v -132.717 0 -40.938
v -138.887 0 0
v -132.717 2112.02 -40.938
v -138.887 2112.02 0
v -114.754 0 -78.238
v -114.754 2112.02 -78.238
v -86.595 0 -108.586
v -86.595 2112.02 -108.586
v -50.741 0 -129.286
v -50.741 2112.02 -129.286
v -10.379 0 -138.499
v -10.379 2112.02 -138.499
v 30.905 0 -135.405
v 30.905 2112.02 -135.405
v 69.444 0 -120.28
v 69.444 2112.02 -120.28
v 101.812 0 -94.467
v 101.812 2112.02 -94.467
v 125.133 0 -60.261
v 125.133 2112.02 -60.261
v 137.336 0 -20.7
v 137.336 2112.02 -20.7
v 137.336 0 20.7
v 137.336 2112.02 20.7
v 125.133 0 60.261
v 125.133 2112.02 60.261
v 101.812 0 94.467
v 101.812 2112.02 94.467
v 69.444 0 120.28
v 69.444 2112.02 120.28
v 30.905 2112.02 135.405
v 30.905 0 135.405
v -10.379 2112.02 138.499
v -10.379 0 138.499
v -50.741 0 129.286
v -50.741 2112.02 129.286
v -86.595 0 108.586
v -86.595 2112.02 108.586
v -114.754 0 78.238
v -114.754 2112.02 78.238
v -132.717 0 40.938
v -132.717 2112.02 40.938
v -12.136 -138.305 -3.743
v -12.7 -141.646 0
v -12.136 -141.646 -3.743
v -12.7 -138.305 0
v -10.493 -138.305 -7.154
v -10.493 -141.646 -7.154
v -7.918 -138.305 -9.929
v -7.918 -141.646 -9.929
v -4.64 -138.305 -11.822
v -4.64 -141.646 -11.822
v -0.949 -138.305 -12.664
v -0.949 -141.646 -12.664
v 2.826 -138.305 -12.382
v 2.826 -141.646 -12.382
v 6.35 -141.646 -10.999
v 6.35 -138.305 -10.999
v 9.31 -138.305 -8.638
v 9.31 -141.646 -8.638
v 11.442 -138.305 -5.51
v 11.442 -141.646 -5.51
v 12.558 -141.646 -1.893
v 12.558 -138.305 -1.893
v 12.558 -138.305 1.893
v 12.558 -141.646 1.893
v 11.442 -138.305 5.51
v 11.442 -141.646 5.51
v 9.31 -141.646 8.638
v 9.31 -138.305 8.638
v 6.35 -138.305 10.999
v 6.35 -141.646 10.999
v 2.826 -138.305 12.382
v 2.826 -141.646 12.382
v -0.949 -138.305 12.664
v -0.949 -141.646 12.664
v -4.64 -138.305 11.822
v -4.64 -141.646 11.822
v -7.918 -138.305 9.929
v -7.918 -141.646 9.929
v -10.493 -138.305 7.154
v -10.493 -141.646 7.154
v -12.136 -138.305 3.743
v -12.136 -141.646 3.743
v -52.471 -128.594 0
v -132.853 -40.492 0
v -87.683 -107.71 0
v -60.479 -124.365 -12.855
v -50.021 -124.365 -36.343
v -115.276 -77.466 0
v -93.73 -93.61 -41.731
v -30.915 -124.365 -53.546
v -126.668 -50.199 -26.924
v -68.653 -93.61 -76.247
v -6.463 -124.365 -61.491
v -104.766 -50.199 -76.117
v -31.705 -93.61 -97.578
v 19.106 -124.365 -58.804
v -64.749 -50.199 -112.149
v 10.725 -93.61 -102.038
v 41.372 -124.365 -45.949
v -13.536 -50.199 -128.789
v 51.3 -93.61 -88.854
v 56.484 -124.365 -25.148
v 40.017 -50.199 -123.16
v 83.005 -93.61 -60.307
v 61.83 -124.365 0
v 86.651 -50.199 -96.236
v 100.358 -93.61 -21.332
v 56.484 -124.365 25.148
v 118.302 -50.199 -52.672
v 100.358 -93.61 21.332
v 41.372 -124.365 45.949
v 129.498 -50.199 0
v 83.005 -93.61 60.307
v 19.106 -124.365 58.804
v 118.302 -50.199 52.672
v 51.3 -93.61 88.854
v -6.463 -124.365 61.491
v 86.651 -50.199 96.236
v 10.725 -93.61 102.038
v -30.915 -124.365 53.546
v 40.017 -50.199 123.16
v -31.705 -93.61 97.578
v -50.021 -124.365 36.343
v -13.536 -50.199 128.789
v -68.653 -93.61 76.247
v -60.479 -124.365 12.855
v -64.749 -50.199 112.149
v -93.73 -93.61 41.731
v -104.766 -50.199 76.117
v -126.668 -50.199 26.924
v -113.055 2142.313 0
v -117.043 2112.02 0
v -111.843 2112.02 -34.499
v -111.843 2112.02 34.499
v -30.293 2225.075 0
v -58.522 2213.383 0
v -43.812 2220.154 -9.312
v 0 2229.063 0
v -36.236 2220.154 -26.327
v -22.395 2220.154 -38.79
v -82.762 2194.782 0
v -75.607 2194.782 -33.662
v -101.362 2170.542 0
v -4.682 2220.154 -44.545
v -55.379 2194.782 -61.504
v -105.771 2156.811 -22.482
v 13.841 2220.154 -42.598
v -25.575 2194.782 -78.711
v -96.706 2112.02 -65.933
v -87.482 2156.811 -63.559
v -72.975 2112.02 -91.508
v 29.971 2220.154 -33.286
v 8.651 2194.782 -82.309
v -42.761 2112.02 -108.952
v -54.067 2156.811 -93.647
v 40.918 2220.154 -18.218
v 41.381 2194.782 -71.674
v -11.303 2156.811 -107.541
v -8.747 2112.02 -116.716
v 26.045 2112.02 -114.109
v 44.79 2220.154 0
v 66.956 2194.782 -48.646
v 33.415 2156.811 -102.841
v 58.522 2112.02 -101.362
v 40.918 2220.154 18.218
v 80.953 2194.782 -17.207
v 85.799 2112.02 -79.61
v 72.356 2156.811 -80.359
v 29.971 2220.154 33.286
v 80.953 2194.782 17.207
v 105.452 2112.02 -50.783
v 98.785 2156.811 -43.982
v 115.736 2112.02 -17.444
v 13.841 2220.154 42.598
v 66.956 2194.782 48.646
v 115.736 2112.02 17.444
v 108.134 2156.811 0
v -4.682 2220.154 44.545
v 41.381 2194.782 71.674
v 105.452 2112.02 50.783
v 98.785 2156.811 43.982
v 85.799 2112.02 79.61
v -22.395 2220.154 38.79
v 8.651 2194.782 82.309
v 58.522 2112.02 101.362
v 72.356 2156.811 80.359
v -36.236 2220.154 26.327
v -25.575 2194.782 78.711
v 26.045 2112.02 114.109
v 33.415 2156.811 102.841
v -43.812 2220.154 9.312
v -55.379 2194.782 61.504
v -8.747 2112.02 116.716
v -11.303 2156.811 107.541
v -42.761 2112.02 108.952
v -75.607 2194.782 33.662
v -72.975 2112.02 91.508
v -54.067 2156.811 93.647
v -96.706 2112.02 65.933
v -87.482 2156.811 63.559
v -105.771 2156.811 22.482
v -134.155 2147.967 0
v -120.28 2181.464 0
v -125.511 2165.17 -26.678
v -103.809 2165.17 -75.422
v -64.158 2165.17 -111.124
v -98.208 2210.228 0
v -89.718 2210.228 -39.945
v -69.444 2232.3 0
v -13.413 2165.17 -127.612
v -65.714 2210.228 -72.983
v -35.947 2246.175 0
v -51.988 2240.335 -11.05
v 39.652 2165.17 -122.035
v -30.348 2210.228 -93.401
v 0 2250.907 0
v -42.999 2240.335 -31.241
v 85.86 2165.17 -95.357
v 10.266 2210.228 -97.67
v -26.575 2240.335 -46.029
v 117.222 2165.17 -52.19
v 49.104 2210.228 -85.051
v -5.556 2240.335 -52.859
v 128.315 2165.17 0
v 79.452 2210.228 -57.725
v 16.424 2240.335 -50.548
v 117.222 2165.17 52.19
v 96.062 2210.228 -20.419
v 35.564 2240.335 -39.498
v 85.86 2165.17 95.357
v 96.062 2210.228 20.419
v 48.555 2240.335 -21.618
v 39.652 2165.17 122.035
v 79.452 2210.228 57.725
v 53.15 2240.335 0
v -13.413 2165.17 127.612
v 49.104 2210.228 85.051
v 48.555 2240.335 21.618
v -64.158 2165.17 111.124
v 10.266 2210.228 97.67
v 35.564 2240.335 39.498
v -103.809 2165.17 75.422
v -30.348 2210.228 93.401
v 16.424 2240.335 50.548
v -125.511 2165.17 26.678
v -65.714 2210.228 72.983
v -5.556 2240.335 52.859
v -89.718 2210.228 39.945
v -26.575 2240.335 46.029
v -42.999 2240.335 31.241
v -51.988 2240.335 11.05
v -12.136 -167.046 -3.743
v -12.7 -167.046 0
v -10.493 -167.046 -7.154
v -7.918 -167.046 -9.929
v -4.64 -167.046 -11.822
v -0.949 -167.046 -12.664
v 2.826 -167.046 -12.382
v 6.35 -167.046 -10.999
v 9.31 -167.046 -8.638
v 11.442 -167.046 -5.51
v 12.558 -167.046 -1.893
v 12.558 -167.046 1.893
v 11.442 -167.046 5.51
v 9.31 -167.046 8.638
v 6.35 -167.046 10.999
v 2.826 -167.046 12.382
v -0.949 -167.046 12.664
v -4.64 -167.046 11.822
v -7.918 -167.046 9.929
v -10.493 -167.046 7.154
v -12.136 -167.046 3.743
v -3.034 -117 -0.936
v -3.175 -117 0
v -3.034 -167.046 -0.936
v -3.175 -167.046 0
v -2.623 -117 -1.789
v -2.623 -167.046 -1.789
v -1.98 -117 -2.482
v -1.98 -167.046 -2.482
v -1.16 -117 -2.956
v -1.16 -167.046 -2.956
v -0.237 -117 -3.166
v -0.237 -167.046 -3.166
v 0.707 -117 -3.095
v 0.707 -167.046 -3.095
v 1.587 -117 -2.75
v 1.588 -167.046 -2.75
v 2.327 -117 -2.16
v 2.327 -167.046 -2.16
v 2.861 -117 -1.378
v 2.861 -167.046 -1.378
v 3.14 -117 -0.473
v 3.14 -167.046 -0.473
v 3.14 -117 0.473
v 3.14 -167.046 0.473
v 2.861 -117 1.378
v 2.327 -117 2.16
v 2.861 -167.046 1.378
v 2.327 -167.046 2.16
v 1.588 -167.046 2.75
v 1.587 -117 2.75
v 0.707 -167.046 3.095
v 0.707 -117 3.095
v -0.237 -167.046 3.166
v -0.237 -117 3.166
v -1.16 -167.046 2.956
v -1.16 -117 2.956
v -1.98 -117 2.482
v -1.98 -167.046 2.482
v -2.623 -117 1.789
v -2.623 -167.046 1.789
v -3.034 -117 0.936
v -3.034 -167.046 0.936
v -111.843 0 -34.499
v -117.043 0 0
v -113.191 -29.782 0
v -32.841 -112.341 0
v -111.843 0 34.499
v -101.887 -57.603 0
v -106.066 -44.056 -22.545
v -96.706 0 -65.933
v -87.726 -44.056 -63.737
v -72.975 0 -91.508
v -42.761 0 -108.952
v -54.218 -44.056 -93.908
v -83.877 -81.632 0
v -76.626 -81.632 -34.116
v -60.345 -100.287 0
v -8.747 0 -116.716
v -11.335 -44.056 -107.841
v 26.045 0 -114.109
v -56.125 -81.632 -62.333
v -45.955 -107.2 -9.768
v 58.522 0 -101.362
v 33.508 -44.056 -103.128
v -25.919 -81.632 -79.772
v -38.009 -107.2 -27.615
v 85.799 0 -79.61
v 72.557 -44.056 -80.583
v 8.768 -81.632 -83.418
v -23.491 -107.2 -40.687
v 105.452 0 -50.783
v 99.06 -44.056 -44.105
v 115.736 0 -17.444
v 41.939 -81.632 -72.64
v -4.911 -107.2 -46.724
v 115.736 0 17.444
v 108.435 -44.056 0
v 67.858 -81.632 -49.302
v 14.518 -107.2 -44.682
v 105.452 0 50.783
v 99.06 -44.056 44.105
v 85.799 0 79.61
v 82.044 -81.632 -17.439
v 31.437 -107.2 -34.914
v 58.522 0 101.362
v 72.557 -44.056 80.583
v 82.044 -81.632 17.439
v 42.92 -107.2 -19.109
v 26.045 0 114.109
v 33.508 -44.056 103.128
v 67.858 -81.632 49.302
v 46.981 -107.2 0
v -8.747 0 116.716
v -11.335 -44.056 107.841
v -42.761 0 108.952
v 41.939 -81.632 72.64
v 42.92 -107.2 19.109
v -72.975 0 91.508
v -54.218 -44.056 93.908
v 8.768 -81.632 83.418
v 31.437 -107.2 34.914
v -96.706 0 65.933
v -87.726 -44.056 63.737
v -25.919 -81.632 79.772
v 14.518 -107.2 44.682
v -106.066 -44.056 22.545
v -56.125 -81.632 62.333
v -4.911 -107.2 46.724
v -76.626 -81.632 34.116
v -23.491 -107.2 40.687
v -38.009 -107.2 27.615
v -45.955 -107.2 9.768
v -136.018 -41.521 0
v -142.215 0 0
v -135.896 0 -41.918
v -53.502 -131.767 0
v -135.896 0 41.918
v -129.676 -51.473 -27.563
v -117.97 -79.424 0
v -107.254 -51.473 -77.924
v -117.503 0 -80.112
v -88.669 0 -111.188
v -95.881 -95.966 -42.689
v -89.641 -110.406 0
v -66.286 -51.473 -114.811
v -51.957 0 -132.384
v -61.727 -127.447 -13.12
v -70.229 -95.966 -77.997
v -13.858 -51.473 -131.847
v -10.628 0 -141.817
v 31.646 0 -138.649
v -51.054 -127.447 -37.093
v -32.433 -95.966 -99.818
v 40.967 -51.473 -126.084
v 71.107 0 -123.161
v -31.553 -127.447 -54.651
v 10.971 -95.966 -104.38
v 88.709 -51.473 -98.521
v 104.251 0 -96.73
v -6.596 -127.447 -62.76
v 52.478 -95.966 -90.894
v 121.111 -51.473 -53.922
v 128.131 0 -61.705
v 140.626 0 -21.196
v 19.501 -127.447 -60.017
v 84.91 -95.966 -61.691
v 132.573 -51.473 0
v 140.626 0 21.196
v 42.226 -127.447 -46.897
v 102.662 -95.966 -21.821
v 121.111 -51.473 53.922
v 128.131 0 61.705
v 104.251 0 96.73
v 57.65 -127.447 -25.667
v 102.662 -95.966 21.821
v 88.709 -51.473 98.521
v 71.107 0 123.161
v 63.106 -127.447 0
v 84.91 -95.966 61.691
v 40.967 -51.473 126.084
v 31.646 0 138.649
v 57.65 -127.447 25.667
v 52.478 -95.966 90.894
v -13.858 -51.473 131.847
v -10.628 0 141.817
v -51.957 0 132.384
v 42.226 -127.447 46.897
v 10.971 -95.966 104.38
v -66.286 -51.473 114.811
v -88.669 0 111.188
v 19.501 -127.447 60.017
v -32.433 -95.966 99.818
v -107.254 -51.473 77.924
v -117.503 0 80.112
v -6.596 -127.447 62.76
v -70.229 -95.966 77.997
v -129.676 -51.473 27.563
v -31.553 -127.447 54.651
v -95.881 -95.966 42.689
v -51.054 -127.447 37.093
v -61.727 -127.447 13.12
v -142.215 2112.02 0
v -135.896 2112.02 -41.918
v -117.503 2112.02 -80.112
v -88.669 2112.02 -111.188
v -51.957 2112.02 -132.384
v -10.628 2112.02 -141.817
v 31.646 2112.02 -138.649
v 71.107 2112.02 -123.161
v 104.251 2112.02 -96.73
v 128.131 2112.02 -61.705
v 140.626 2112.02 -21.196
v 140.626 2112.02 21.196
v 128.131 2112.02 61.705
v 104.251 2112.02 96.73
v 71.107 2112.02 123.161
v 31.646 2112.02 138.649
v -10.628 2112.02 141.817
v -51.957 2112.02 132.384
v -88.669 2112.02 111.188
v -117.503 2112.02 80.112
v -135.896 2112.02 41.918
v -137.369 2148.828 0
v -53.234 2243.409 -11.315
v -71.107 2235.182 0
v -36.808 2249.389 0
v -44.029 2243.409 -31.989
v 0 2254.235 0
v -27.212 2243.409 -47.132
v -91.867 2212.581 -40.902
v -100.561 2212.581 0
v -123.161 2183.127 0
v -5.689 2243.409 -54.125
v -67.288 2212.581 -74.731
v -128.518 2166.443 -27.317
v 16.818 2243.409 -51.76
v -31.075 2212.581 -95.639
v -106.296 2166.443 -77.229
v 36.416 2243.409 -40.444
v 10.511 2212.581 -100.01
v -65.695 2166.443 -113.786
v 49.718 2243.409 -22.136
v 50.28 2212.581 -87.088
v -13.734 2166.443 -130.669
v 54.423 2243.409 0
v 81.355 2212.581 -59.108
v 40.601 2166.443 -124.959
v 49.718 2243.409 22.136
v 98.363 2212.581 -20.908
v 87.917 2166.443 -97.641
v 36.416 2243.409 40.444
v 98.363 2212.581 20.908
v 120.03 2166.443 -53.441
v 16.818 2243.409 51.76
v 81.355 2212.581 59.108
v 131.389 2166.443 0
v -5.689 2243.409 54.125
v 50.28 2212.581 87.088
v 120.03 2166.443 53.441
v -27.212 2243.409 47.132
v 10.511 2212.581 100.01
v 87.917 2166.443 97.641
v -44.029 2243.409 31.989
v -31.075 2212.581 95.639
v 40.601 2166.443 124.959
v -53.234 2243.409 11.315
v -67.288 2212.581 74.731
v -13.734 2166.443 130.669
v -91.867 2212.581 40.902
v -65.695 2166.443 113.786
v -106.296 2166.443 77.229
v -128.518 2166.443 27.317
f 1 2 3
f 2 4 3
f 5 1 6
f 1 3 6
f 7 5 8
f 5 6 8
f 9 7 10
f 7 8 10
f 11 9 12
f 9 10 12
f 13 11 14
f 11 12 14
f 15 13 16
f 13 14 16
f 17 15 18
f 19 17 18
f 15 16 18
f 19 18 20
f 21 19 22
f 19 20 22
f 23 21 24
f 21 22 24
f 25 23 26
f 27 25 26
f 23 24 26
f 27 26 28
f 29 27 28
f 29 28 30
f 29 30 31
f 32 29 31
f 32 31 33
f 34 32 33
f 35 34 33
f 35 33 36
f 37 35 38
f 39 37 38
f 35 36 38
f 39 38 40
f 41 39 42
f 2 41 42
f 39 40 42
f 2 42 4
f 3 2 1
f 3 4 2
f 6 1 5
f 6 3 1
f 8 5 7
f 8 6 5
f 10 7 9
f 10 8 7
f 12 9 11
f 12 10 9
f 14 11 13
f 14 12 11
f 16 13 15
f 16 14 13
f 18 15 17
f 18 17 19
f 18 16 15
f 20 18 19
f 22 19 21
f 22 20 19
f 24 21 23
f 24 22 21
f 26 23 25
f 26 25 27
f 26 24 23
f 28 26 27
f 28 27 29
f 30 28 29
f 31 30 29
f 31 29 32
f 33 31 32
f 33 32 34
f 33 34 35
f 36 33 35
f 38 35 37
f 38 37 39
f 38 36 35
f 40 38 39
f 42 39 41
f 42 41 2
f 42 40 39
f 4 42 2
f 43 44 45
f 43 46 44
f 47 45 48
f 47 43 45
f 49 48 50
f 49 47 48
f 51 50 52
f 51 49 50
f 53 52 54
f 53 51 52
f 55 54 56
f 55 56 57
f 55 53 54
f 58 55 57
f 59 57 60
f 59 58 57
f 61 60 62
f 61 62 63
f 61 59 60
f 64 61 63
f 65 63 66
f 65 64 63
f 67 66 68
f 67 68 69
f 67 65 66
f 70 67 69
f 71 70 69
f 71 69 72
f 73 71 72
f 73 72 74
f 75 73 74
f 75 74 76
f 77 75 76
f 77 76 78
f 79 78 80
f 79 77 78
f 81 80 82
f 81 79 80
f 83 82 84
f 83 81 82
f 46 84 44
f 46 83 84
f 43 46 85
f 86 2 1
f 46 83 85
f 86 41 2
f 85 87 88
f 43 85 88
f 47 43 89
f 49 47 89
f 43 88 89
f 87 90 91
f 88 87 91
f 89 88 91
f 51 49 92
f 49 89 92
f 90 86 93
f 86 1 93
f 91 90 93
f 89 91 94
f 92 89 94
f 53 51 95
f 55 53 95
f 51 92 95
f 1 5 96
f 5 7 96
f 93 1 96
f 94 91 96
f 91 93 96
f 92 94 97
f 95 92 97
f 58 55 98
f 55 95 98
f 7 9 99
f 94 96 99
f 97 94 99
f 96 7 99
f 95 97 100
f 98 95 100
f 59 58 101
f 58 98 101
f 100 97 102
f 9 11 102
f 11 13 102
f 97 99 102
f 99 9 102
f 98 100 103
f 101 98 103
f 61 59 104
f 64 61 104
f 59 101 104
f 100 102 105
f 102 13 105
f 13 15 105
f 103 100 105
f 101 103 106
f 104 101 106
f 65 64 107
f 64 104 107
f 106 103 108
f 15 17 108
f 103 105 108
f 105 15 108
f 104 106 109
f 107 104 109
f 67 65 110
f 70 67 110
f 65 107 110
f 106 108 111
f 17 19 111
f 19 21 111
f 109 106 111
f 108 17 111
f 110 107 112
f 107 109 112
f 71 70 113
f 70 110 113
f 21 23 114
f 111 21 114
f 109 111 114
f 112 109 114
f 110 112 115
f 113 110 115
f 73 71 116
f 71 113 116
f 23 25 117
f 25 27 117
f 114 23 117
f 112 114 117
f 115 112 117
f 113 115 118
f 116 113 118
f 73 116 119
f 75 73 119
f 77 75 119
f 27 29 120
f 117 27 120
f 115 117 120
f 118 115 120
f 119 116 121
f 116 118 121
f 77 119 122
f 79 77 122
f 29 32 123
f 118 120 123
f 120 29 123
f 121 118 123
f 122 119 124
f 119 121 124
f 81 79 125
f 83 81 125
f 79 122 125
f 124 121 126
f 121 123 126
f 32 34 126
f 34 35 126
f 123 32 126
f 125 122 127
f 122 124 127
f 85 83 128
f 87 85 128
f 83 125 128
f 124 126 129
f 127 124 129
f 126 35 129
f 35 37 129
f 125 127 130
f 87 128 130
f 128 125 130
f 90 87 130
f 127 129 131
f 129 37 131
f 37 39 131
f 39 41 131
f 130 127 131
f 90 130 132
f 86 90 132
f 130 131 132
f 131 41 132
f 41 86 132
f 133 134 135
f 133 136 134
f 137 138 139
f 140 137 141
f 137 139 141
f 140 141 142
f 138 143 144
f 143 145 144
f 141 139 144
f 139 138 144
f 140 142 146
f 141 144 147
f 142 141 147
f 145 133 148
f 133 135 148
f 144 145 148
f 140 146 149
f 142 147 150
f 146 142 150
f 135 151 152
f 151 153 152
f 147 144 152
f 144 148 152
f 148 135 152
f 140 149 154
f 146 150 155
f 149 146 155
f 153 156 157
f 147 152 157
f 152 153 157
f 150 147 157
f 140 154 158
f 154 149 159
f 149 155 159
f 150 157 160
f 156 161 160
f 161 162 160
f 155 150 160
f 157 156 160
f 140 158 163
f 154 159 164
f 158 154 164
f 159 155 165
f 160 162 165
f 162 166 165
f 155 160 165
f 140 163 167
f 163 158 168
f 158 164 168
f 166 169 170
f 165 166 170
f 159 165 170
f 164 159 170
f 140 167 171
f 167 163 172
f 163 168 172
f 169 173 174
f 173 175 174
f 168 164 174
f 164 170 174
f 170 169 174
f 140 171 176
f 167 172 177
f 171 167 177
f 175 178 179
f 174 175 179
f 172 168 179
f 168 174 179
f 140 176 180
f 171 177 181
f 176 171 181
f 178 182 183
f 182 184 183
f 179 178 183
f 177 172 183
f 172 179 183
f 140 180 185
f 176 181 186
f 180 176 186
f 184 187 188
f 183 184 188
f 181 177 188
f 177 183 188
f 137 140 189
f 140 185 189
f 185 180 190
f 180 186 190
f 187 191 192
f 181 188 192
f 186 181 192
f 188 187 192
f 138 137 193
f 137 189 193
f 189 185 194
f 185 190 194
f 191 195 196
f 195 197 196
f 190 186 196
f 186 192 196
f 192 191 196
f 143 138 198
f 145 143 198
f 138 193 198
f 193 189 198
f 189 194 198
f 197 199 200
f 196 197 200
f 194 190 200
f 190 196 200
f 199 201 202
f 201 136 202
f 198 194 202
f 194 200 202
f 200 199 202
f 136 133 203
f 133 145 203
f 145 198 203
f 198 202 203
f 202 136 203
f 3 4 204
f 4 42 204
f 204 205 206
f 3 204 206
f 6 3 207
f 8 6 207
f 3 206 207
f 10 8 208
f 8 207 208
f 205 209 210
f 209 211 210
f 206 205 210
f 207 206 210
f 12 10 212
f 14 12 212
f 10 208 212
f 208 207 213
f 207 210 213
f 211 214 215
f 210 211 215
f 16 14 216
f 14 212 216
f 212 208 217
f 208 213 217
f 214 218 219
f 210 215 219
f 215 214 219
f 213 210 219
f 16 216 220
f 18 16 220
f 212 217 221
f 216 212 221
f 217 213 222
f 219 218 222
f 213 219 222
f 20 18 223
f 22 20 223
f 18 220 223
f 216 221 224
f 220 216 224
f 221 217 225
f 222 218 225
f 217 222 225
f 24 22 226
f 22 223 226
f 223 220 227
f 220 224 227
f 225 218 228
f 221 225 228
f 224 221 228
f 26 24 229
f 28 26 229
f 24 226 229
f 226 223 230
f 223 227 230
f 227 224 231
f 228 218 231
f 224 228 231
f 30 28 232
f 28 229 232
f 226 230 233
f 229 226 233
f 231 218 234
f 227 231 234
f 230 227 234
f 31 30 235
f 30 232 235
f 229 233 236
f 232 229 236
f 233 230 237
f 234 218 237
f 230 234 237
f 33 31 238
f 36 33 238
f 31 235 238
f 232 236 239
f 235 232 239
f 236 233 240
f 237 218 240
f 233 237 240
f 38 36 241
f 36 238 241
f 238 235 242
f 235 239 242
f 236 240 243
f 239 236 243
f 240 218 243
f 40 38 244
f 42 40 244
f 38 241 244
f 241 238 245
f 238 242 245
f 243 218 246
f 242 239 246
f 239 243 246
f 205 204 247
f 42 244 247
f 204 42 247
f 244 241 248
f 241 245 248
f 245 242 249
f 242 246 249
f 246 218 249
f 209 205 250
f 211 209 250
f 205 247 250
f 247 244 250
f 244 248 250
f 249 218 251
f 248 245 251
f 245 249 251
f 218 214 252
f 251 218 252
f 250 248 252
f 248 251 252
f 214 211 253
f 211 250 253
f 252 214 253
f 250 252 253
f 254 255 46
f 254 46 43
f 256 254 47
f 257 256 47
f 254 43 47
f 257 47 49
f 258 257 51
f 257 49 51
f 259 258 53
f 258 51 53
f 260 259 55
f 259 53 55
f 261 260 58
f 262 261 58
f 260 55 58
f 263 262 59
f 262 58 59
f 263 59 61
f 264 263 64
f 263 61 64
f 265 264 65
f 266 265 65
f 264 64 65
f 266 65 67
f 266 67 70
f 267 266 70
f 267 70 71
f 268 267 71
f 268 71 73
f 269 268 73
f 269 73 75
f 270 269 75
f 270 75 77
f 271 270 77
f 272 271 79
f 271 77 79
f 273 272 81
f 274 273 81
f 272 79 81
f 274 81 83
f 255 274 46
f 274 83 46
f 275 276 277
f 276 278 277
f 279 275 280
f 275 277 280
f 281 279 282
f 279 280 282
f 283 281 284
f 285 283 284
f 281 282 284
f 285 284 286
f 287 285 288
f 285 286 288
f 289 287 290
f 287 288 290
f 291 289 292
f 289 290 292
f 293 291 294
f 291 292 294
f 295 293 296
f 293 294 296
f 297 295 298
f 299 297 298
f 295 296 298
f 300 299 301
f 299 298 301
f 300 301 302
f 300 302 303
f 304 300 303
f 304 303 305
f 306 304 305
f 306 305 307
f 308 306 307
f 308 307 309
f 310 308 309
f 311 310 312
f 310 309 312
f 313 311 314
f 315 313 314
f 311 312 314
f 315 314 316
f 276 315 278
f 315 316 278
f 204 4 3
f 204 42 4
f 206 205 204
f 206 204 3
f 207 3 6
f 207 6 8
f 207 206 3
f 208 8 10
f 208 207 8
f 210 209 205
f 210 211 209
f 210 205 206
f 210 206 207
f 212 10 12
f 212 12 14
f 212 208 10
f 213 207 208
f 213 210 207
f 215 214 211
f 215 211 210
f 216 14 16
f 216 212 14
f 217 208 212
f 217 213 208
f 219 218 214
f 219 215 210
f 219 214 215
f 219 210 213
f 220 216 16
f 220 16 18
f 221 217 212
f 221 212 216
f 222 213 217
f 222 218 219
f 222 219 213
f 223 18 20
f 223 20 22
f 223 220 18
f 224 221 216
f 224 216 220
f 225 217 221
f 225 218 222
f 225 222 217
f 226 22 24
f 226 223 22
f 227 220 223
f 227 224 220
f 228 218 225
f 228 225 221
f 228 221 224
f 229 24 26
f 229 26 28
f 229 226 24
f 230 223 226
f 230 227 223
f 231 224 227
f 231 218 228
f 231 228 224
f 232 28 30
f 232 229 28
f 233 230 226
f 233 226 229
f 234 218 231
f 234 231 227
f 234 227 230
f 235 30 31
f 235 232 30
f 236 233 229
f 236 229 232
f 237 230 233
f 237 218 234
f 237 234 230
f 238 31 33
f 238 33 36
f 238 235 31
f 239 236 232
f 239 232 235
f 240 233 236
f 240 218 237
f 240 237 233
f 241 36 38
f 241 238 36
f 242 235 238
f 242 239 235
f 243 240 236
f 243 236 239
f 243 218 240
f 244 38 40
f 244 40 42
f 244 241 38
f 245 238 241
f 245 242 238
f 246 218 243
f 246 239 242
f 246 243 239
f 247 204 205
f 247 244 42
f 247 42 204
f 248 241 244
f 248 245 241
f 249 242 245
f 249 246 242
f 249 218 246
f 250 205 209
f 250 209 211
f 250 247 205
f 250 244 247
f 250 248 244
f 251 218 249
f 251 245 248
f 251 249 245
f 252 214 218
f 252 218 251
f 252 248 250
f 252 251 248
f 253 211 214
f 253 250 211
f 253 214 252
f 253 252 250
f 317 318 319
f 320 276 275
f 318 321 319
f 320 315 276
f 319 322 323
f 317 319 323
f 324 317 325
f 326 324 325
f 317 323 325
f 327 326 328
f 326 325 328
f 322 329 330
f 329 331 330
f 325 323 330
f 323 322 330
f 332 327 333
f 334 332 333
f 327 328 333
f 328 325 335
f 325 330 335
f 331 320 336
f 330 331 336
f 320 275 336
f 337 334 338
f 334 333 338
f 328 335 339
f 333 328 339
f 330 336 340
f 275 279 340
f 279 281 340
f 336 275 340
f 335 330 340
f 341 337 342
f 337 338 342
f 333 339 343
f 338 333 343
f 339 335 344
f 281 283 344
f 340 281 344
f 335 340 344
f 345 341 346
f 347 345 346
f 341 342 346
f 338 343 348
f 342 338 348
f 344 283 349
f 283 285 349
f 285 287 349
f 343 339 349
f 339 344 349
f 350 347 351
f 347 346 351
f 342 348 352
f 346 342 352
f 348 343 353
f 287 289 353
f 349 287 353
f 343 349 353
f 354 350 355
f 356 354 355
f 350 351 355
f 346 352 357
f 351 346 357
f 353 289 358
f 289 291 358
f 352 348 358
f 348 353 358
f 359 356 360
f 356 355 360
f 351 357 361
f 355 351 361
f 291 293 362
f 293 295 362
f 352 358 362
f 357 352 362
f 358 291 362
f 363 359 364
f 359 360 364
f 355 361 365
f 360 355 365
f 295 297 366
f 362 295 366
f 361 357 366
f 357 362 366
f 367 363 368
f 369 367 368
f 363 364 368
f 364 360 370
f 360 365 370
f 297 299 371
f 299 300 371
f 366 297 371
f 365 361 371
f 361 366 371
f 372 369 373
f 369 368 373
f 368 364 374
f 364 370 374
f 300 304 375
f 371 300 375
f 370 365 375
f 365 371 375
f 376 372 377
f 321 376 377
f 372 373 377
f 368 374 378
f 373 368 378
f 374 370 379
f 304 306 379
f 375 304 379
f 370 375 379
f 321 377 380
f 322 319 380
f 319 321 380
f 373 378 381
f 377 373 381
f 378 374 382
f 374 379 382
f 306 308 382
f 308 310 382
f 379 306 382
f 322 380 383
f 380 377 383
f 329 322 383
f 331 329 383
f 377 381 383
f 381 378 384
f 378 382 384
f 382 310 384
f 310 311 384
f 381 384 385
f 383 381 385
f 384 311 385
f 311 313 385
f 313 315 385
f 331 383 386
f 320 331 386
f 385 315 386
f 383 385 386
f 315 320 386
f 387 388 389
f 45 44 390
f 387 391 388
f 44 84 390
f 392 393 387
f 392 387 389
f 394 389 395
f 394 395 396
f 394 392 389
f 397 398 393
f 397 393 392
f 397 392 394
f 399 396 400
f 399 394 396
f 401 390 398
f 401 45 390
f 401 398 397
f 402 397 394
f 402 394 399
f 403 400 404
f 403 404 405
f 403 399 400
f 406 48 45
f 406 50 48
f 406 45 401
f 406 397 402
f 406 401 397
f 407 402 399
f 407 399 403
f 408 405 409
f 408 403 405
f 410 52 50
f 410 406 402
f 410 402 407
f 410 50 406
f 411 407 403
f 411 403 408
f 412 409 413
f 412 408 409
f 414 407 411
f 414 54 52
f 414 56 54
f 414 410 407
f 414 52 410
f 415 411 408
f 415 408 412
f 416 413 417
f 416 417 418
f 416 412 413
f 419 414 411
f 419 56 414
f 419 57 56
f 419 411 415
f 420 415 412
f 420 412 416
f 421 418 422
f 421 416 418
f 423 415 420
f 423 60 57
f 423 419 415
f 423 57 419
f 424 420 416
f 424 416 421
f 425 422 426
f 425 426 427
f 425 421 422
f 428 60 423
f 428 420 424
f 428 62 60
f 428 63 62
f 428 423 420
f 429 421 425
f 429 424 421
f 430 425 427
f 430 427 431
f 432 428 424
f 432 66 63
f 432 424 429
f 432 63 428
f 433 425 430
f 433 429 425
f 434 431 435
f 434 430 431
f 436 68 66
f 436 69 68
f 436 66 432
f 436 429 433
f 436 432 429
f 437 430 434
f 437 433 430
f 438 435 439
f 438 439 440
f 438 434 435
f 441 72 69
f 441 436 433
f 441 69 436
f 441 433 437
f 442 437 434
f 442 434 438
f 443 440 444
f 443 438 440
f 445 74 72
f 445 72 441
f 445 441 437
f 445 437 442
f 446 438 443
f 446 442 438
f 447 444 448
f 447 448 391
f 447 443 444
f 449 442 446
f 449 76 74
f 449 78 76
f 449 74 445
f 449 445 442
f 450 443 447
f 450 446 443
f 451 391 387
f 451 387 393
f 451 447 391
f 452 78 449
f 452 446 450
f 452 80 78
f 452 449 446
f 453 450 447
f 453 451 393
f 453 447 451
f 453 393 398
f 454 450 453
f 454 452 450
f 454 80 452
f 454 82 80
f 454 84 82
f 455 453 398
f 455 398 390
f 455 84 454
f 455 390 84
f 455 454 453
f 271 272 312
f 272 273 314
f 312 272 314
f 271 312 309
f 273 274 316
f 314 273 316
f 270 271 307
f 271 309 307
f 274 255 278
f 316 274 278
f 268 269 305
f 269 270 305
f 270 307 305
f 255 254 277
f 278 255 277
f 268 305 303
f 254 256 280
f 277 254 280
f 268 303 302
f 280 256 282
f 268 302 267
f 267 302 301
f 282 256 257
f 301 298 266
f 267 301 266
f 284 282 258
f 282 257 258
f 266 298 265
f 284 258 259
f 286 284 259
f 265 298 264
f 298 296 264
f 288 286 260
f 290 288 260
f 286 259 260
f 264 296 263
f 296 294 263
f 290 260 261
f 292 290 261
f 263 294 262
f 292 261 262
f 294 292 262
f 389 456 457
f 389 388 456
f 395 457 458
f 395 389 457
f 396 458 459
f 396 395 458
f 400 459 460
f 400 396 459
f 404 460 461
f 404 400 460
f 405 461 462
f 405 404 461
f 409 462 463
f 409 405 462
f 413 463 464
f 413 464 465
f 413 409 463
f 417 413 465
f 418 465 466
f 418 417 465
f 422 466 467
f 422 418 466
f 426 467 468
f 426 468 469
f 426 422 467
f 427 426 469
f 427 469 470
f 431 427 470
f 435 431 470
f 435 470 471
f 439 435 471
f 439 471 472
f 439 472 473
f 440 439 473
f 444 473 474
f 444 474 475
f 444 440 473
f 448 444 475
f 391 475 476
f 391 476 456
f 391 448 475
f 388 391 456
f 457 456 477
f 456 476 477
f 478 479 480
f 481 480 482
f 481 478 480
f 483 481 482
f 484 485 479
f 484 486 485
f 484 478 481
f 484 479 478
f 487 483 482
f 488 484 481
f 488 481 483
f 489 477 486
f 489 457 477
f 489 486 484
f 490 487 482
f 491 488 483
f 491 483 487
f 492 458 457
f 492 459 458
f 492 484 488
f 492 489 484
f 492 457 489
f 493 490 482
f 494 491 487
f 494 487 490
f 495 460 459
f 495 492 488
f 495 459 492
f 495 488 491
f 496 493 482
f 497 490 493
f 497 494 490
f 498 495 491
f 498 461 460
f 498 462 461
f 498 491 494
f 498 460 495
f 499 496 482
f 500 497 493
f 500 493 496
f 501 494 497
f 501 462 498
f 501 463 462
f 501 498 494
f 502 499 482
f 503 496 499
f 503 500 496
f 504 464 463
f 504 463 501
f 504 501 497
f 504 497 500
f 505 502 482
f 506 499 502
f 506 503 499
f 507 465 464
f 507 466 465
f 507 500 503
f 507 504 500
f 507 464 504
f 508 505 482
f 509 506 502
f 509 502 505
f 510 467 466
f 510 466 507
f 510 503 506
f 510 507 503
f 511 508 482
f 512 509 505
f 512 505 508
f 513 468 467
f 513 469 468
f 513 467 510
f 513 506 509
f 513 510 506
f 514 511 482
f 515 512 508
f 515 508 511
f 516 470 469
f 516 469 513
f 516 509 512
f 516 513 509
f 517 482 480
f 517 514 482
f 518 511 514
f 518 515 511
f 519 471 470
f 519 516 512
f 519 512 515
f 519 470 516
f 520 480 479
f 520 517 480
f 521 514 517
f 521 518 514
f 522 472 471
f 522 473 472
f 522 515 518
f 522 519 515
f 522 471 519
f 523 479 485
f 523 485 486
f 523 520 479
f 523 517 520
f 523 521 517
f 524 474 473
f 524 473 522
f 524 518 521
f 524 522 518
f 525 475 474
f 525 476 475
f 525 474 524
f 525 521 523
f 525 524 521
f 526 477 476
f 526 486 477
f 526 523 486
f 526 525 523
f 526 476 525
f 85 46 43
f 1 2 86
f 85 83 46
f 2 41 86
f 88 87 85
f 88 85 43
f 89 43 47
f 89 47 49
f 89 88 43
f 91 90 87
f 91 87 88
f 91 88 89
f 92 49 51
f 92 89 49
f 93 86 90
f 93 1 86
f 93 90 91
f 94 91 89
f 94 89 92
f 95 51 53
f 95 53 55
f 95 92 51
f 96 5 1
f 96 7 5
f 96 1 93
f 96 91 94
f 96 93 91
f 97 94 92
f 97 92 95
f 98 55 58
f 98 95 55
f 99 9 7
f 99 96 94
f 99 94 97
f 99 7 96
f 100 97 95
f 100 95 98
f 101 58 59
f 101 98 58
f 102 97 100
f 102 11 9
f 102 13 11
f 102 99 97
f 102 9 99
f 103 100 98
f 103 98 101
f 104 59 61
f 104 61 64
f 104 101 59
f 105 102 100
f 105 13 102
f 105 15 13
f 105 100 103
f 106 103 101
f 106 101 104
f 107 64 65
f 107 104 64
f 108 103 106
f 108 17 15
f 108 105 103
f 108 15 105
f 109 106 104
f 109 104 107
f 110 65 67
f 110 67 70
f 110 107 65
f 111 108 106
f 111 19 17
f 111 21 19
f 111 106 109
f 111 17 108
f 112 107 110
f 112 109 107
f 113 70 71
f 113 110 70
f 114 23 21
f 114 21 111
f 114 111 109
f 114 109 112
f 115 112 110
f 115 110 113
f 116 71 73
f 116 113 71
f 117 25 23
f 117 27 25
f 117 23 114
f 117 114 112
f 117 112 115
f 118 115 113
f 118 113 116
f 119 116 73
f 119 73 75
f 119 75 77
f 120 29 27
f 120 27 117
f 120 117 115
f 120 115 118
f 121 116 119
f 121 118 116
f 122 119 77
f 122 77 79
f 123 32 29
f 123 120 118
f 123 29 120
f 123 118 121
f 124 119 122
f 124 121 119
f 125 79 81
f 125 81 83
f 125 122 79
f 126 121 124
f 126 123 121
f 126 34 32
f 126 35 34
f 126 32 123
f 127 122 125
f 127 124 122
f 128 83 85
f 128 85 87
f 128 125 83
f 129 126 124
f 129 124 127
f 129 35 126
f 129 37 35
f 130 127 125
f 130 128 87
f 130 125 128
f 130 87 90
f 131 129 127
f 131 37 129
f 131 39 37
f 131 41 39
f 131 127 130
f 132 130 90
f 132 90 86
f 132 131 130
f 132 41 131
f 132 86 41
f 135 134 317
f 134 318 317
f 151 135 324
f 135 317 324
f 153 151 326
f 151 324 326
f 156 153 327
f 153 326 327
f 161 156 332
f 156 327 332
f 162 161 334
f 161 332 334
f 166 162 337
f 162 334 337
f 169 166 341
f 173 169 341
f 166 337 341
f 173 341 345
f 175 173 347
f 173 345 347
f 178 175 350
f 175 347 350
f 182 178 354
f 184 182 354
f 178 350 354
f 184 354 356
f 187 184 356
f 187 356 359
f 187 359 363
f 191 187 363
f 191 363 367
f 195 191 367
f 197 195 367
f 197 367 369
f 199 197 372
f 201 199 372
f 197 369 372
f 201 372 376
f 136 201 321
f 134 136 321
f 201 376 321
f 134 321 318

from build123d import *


with BuildPart() as part:
    # Sketch1 (on Front Plane) → Revolve1 (revolve)
    with BuildSketch(Plane.XY):
        with BuildLine():
            Line((-117.0432, 2112.02016), (-117.0432, 0))
            ThreePointArc((-117.0432, 0), (-83.877061305, -81.631790701), (-3.175, -117.000128381))
            Line((-3.175, -117.000128381), (-3.175, -167.046399365))
            Line((-3.175, -167.046399365), (-12.7, -167.046399365))
            Line((-12.7, -167.046399365), (-12.7, -138.305330063))
            ThreePointArc((-12.7, -138.305330063), (-102.600004298, -93.610327646), (-138.8872, 0))
            Line((-138.8872, 0), (-138.8872, 2112.02016))
            ThreePointArc((-138.8872, 2112.02016), (-98.20808094, 2210.22824094), (0, 2250.90736))
            Line((0, 2250.90736), (0, 2229.06336))
            ThreePointArc((0, 2229.06336), (-82.762040412, 2194.782200412), (-117.0432, 2112.02016))
        make_face()
    revolve(axis=Axis((0, 50.358015581, 0), (0, -1, 0)))


with BuildPart() as body_2:
    # Sketch1<4> → Revolve2 (revolve)
    with BuildSketch(Plane.XY):
        with BuildLine():
            ThreePointArc((-138.8872, 2112.02016), (-98.20808094, 2210.22824094), (0, 2250.90736))
            Line((0, 2250.90736), (0, 2254.23476))
            ThreePointArc((0, 2254.23476), (-100.560908044, 2212.581068044), (-142.2146, 2112.02016))
            Line((-142.2146, 2112.02016), (-142.2146, 0))
            ThreePointArc((-142.2146, 0), (-104.955032926, -95.965793471), (-12.7, -141.646399365))
            Line((-12.7, -141.646399365), (-12.7, -138.305330063))
            ThreePointArc((-12.7, -138.305330063), (-102.600004298, -93.610327646), (-138.8872, 0))
            Line((-138.8872, 0), (-138.8872, 2112.02016))
        make_face()
    revolve(axis=Axis((0, 50.358015581, 0), (0, -1, 0)))


solid = Compound([part.part, body_2.part])
